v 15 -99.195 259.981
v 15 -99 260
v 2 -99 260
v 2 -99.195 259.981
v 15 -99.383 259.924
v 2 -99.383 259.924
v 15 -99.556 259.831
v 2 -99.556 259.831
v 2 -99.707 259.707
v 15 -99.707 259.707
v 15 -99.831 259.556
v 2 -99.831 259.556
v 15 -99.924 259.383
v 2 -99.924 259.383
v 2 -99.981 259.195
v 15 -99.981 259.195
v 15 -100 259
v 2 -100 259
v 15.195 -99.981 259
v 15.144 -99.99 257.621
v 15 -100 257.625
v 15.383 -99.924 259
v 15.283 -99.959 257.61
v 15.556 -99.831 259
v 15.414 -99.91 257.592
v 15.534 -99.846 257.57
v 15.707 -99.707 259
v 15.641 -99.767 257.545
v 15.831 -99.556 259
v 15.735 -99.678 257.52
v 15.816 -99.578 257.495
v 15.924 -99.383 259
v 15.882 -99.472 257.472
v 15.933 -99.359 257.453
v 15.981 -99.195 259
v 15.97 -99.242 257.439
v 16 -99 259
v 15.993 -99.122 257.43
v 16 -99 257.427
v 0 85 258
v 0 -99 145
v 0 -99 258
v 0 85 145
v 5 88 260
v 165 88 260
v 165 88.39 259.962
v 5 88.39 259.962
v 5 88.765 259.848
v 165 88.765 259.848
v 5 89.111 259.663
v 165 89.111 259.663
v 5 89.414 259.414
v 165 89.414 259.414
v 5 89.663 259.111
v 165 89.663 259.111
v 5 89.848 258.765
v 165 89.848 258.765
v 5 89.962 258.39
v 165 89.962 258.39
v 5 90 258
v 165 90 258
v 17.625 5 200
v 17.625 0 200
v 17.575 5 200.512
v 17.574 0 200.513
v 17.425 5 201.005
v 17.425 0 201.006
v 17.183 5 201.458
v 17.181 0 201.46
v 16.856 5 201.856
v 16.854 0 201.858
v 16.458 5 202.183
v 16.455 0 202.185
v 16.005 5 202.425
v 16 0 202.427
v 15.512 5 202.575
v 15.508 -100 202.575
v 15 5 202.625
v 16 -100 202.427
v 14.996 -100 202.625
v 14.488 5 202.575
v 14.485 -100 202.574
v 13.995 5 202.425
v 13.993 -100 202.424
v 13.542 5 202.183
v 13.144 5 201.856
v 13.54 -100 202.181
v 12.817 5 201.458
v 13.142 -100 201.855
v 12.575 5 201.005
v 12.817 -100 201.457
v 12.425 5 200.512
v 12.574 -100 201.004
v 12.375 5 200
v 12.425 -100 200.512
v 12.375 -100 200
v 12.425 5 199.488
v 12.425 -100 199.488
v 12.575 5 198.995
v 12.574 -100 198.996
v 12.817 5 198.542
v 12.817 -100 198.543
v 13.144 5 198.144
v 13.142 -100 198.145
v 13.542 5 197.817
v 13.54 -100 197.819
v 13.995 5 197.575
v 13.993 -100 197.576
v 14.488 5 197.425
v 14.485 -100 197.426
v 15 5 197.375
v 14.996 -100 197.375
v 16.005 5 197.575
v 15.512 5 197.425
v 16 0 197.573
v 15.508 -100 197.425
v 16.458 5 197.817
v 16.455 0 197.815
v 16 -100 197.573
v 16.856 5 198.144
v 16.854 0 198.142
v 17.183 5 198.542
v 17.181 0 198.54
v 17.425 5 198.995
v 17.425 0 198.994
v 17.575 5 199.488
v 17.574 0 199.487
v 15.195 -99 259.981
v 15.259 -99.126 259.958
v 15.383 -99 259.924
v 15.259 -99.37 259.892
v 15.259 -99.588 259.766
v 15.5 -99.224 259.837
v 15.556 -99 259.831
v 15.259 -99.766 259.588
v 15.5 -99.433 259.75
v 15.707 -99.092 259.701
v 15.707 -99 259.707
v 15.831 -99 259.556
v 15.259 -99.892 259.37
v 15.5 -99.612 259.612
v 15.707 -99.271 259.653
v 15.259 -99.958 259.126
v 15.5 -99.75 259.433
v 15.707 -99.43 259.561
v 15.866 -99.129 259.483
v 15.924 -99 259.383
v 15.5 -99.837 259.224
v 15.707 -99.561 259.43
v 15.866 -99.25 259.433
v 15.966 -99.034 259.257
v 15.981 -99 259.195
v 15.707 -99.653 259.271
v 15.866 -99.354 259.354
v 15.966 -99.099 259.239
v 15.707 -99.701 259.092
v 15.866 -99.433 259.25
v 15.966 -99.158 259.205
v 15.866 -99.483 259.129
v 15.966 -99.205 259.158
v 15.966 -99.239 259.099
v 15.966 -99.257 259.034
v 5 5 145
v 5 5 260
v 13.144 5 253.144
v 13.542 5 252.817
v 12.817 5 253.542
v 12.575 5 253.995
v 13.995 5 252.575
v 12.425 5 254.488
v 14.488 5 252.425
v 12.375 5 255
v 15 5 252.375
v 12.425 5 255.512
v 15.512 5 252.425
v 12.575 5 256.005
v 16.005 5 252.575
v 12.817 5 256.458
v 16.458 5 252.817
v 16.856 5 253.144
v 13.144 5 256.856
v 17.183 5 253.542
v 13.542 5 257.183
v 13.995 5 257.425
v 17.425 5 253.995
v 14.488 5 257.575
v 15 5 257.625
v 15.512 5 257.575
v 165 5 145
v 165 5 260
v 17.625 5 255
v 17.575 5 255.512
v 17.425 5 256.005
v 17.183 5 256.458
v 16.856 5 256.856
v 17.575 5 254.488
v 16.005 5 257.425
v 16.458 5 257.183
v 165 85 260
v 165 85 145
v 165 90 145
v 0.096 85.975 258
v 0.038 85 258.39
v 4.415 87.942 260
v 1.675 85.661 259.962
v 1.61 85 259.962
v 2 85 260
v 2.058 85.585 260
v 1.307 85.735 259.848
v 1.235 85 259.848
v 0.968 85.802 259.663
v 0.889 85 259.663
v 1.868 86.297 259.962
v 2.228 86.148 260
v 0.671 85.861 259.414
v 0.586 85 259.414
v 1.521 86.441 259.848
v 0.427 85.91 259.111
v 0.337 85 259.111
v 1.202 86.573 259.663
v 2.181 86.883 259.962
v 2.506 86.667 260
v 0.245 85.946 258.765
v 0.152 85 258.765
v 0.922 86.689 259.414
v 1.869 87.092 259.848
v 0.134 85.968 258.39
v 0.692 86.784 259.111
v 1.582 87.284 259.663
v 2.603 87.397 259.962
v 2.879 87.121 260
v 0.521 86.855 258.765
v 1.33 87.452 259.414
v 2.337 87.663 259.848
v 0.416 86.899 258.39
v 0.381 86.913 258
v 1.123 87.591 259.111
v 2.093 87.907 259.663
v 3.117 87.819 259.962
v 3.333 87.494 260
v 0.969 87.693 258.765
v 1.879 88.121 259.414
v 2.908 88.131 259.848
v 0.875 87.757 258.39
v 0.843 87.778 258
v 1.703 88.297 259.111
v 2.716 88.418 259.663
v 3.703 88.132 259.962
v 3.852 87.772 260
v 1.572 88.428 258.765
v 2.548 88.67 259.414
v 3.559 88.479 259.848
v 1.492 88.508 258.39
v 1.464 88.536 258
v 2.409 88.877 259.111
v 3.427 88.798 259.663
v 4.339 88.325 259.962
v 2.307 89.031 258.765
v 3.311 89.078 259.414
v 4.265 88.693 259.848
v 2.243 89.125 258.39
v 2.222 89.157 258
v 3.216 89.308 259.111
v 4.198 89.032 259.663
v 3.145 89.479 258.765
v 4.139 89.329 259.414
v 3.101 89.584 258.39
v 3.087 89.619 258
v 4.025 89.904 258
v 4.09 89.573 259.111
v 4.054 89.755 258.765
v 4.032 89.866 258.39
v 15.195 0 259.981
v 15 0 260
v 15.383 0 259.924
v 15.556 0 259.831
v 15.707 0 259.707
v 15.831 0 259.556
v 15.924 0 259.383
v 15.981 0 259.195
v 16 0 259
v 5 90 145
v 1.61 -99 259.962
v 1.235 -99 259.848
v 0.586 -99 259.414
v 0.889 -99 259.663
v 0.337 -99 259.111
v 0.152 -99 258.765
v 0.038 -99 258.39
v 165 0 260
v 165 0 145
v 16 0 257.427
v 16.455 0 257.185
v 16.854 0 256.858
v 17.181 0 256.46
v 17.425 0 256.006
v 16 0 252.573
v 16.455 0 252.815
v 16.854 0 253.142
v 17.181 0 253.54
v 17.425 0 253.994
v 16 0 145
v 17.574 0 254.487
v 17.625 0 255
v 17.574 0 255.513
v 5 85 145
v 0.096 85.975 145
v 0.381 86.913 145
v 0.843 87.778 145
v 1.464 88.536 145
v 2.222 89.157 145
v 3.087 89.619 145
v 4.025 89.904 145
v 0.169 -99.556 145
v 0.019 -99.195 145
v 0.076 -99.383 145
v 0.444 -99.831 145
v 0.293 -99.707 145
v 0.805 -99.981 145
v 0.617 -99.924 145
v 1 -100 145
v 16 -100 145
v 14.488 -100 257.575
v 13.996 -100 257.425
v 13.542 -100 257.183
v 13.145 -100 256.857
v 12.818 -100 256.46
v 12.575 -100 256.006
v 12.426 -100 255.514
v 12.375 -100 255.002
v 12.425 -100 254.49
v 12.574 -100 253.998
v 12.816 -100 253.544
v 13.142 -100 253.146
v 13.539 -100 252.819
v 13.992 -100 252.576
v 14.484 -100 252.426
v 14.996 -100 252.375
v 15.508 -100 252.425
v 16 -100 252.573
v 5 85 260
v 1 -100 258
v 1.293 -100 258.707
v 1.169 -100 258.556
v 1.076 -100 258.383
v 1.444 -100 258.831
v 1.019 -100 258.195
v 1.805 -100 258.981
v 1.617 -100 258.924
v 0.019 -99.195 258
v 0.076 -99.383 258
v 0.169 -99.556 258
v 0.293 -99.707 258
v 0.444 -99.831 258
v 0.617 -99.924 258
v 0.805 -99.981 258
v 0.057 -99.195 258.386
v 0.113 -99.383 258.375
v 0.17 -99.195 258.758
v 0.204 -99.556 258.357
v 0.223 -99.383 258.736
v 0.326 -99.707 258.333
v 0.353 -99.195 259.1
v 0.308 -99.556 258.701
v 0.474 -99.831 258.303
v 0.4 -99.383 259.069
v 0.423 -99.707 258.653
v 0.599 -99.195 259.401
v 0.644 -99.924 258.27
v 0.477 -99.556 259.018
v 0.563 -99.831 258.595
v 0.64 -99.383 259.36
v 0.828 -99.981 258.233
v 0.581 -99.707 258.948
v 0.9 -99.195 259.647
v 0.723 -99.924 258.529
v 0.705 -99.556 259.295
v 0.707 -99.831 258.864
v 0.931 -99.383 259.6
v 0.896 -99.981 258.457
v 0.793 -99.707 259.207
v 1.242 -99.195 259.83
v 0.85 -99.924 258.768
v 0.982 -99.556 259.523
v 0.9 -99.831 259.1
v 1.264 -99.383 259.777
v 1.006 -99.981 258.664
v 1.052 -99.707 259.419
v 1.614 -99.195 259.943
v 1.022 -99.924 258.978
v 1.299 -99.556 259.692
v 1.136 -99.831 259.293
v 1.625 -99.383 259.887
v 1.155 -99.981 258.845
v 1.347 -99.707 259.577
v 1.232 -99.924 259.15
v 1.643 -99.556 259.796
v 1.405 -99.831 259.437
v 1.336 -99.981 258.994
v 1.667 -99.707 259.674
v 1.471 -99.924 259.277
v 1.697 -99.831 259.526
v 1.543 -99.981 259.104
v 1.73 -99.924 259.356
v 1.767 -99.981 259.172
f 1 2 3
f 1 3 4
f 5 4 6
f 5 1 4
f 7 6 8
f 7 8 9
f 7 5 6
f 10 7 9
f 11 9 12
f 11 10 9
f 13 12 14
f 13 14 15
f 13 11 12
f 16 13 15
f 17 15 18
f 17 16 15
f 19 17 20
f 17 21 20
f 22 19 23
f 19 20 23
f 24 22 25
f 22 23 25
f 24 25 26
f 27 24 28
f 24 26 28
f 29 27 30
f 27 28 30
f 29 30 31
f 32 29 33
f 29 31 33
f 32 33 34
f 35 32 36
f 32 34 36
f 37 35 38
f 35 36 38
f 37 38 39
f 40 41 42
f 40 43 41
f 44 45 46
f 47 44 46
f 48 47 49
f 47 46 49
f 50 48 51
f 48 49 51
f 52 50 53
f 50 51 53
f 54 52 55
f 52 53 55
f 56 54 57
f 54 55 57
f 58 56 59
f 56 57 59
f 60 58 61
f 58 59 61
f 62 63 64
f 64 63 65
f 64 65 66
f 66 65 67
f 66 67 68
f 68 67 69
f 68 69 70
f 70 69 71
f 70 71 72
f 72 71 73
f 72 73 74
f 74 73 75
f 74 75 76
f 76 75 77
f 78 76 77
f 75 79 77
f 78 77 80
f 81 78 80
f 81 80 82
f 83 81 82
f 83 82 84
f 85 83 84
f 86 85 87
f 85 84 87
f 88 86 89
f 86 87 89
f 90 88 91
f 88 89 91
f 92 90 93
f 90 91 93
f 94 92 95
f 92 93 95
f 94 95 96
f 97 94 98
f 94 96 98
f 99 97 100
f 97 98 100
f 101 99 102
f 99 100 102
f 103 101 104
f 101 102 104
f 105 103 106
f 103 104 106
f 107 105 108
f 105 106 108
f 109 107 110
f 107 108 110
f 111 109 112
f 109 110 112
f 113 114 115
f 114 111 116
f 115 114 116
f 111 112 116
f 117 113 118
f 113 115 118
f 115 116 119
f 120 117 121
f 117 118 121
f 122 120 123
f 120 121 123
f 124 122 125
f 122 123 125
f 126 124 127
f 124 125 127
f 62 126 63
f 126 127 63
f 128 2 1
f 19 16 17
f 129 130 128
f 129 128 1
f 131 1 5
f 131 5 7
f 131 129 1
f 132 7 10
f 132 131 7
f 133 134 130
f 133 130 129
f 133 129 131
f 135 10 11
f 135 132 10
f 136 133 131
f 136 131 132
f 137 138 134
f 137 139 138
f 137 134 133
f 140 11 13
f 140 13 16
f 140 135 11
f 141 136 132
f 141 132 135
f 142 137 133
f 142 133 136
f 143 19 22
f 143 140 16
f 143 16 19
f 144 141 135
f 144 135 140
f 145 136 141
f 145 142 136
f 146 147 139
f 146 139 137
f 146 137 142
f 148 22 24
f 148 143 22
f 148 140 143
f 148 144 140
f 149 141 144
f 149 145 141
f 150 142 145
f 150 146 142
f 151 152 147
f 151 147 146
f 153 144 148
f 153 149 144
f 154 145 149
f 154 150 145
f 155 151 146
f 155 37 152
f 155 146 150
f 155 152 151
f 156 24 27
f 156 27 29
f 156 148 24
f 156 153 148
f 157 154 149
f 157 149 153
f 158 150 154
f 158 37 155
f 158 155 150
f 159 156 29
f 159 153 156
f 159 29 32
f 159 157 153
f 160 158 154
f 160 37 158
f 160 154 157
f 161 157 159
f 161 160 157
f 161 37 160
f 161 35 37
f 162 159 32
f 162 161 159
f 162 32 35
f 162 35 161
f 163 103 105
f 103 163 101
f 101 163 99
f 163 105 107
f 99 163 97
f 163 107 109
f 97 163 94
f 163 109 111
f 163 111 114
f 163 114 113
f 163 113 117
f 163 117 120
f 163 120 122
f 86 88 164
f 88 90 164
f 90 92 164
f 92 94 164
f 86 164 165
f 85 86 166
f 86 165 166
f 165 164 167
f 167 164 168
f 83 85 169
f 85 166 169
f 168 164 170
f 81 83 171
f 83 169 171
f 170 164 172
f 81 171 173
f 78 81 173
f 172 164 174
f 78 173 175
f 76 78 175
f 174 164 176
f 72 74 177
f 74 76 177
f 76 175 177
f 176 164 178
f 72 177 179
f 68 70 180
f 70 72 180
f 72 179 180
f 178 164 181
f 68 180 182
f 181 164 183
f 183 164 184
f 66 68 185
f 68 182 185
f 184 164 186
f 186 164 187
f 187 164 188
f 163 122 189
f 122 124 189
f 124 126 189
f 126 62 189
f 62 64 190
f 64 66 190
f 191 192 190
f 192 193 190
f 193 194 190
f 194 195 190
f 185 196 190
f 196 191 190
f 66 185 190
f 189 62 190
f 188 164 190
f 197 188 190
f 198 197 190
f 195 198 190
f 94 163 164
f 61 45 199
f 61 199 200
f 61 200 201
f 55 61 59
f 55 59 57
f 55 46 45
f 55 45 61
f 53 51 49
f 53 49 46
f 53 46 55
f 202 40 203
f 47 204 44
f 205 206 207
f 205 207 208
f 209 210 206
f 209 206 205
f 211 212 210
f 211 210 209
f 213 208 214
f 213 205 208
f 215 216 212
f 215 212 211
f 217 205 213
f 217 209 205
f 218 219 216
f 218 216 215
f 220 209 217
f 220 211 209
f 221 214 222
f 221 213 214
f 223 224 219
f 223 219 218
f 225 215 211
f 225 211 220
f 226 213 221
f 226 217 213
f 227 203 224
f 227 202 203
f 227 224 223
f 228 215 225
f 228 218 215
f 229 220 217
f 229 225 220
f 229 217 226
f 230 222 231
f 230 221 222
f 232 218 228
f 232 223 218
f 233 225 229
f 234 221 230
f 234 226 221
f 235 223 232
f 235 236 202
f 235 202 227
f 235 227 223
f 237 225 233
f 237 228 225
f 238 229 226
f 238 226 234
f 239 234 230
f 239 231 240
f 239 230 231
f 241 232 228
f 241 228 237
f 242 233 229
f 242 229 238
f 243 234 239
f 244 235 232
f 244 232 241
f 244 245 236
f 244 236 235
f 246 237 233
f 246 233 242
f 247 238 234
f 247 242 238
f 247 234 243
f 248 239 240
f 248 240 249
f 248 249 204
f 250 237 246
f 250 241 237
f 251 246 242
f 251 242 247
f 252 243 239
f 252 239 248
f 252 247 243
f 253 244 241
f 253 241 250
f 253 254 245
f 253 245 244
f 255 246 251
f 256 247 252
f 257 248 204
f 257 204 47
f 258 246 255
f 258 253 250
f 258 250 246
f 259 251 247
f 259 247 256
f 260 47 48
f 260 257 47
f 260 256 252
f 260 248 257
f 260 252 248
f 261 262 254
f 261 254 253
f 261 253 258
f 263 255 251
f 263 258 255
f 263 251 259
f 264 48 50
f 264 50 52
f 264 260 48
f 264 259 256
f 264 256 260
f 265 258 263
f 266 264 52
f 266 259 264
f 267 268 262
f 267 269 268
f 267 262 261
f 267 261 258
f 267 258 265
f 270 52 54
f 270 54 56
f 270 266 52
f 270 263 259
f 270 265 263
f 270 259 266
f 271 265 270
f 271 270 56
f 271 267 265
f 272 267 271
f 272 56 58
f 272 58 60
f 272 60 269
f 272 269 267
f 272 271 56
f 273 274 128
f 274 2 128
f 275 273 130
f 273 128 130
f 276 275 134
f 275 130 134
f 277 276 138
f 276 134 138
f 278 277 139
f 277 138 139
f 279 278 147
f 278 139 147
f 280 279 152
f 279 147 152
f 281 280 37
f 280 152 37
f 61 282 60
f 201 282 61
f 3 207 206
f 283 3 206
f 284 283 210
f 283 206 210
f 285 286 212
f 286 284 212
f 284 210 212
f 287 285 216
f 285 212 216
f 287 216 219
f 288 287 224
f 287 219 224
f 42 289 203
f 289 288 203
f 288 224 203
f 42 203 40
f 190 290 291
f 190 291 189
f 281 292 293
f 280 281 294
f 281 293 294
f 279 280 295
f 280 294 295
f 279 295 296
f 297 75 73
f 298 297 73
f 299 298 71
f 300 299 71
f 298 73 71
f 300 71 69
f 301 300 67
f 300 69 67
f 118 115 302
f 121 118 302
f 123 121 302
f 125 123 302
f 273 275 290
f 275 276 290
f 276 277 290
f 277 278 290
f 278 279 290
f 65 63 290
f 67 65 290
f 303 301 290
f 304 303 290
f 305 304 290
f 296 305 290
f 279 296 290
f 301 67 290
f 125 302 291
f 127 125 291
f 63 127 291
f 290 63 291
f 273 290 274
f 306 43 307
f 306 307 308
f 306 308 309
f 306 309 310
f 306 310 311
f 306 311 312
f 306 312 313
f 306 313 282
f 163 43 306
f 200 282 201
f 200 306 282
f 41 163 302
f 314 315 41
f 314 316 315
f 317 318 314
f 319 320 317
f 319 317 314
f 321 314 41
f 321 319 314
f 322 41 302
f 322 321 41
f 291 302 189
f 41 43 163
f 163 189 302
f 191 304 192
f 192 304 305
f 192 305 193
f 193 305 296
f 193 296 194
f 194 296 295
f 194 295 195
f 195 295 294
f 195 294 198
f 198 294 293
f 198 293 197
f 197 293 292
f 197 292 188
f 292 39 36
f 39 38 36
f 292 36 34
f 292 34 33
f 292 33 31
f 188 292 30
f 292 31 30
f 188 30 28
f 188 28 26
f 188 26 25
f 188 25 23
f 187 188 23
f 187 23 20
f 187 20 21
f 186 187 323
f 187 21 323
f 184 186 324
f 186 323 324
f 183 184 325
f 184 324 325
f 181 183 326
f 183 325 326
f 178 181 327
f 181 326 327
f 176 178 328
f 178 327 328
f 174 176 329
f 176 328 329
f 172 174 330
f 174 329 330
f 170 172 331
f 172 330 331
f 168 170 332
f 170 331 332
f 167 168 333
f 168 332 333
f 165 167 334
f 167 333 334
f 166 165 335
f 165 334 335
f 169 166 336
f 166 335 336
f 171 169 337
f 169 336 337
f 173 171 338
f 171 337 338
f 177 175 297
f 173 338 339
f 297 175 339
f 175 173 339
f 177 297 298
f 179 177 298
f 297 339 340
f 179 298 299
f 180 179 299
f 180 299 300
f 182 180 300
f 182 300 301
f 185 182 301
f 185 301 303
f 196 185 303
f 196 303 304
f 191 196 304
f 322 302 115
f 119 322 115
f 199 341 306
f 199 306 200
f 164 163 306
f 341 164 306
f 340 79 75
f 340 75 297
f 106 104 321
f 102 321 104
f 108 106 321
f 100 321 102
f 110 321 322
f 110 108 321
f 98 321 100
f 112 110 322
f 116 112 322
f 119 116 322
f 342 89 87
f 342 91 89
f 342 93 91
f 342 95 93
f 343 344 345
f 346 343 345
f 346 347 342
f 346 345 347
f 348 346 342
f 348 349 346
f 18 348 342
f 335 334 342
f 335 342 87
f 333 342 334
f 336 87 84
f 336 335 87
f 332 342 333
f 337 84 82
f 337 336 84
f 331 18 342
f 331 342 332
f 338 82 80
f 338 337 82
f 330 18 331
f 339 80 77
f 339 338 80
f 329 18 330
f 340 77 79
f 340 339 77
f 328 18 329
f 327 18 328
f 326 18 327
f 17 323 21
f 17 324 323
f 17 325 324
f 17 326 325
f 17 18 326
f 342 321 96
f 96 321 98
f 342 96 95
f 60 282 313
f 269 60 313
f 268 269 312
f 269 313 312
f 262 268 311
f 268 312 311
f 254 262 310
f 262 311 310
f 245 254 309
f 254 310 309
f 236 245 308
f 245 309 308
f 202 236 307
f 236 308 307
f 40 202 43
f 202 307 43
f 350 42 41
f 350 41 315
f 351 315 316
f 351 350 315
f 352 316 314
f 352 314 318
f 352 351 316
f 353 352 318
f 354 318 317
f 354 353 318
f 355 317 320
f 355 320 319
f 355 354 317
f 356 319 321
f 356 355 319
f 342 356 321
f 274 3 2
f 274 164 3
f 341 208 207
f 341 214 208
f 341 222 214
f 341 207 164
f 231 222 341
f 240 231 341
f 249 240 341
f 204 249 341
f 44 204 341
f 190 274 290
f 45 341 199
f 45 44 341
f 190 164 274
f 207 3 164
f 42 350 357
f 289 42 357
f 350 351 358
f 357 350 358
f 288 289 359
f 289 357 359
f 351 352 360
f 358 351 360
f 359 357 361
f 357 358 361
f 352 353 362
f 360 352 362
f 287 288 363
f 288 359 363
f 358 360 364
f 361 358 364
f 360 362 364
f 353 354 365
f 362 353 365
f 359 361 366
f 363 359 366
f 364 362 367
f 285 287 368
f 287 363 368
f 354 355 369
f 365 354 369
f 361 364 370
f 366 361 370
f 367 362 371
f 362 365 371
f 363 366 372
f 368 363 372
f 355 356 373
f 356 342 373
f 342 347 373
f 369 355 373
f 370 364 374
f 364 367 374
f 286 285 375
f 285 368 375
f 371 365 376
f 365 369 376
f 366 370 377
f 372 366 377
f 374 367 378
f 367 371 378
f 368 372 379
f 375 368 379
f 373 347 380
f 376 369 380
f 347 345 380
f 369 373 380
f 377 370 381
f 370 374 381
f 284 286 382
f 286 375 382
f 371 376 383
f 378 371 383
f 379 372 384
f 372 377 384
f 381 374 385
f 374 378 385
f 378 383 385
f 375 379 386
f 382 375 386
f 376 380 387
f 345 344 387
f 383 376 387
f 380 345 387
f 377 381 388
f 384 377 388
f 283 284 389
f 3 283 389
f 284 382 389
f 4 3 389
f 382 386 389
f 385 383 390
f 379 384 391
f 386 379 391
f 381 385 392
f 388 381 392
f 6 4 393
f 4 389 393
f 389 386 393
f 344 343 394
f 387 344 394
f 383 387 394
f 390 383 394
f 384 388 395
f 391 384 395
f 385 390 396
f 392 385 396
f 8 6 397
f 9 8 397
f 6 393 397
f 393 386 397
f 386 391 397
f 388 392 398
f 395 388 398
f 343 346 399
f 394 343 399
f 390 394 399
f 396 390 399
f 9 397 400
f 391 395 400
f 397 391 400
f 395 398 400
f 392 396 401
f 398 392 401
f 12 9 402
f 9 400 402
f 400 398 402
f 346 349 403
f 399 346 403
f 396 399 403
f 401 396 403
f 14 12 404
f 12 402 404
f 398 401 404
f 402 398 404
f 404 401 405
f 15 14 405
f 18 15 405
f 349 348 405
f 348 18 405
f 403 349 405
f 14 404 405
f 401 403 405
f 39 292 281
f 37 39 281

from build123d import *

# Parameters (mm, degrees)
SKETCH_W        = 330
SKETCH_H        = 90
PAD_DEPTH       = 260
SKETCH001_W     = 320
SKETCH001_H     = 80
POCKET_DEPTH    = 250
SKETCH002_W     = 16
SKETCH002_H     = 260
PAD001_DEPTH    = 100
SKETCH003_R     = 2.625
POCKET001_DEPTH = 105
FILLET_R        = 5
FILLET001_R     = 5
FILLET002_R     = 5
FILLET003_R     = 2
FILLET004_R     = 1
FILLET005_R     = 1
FILLET006_R     = 1
FILLET007_R     = 1
SKETCH004_W     = 298
SKETCH004_H     = 5
PAD002_DEPTH    = 100
FILLET008_R     = 1
SKETCH005_W     = 390
SKETCH005_H     = 230
POCKET002_DEPTH = 145
SKETCH006_W     = 165
SKETCH006_H     = 230
POCKET003_DEPTH = 300


with BuildPart() as part:
    # Sketch → Pad (new body)
    with BuildSketch(Plane.XY):
        with Locations((165, 45)):
            Rectangle(SKETCH_W, SKETCH_H)
    extrude(amount=PAD_DEPTH)

    # Sketch001 (on Face6 of Pad) → Pocket (cut)
    with BuildSketch(Plane.XY.offset(260)):
        with Locations((165, 45)):
            Rectangle(SKETCH001_W, SKETCH001_H)
    extrude(amount=-POCKET_DEPTH, mode=Mode.SUBTRACT)

    # Sketch002 (on Face1 of Pocket) → Pad001 (join)
    with BuildSketch(Plane.XZ):
        with Locations((8, 130)):
            Rectangle(SKETCH002_W, SKETCH002_H)
        with Locations((322, 130)):
            Rectangle(SKETCH002_W, SKETCH002_H)
    extrude(amount=PAD001_DEPTH)

    # Sketch003 (on Face18 of Pad001) → Pocket001 (cut)
    with BuildSketch(Plane.XZ.offset(100)):
        with Locations((15, 40)):
            Circle(SKETCH003_R)
        with Locations((315, 40)):
            Circle(SKETCH003_R)
        with Locations((15, 120)):
            Circle(SKETCH003_R)
        with Locations((315, 120)):
            Circle(SKETCH003_R)
        with Locations((15, 200)):
            Circle(SKETCH003_R)
        with Locations((315, 200)):
            Circle(SKETCH003_R)
        with Locations((15, 255)):
            Circle(SKETCH003_R)
        with Locations((315, 255)):
            Circle(SKETCH003_R)
    extrude(amount=-POCKET001_DEPTH, mode=Mode.SUBTRACT)

    # Fillet
    fillet_edges = [part.edges().sort_by_distance(p)[0] for p in [
        (0, 45, 0),
    ]]
    fillet(fillet_edges, radius=FILLET_R)

    # Fillet001
    fillet001_edges = [part.edges().sort_by_distance(p)[0] for p in [
        (330, 45, 0),
    ]]
    fillet(fillet001_edges, radius=FILLET001_R)

    # Fillet002
    fillet002_edges = [part.edges().sort_by_distance(p)[0] for p in [
        (165, 90, 0),
    ]]
    fillet(fillet002_edges, radius=FILLET002_R)

    # Fillet003
    fillet003_edges = [part.edges().sort_by_distance(p)[0] for p in [
        (0, -50, 260),
    ]]
    fillet(fillet003_edges, radius=FILLET003_R)

    # Fillet004
    fillet004_edges = [part.edges().sort_by_distance(p)[0] for p in [
        (9, -100, 260),
    ]]
    fillet(fillet004_edges, radius=FILLET004_R)

    # Fillet005
    fillet005_edges = [part.edges().sort_by_distance(p)[0] for p in [
        (16, -49.5, 260),
    ]]
    fillet(fillet005_edges, radius=FILLET005_R)

    # Fillet006
    fillet006_edges = [part.edges().sort_by_distance(p)[0] for p in [
        (321, -100, 260),
    ]]
    fillet(fillet006_edges, radius=FILLET006_R)

    # Fillet007
    fillet007_edges = [part.edges().sort_by_distance(p)[0] for p in [
        (314, -49.5, 260),
    ]]
    fillet(fillet007_edges, radius=FILLET007_R)

    # Sketch004 (on Face4 of Fillet007) → Pad002 (join)
    with BuildSketch(Plane.XZ):
        with Locations((165, 2.5)):
            Rectangle(SKETCH004_W, SKETCH004_H)
    extrude(amount=PAD002_DEPTH)

    # Fillet008
    fillet008_edges = [part.edges().sort_by_distance(p)[0] for p in [
        (165, -100, 0),
    ]]
    fillet(fillet008_edges, radius=FILLET008_R)

    # Sketch005 (on Face7 of Fillet008) → Pocket002 (cut)
    with BuildSketch(Plane(origin=(0, 0, 0), x_dir=(1, 0, 0), z_dir=(0, 0, -1))):
        with Locations((175, 0)):
            Rectangle(SKETCH005_W, SKETCH005_H)
    extrude(amount=-POCKET002_DEPTH, mode=Mode.SUBTRACT)

    # Sketch006 (on Face46 of Pocket002) → Pocket003 (cut)
    with BuildSketch(Plane.XY.offset(260)):
        with Locations((247.5, 0)):
            Rectangle(SKETCH006_W, SKETCH006_H)
    extrude(amount=-POCKET003_DEPTH, mode=Mode.SUBTRACT)


solid = part.part
